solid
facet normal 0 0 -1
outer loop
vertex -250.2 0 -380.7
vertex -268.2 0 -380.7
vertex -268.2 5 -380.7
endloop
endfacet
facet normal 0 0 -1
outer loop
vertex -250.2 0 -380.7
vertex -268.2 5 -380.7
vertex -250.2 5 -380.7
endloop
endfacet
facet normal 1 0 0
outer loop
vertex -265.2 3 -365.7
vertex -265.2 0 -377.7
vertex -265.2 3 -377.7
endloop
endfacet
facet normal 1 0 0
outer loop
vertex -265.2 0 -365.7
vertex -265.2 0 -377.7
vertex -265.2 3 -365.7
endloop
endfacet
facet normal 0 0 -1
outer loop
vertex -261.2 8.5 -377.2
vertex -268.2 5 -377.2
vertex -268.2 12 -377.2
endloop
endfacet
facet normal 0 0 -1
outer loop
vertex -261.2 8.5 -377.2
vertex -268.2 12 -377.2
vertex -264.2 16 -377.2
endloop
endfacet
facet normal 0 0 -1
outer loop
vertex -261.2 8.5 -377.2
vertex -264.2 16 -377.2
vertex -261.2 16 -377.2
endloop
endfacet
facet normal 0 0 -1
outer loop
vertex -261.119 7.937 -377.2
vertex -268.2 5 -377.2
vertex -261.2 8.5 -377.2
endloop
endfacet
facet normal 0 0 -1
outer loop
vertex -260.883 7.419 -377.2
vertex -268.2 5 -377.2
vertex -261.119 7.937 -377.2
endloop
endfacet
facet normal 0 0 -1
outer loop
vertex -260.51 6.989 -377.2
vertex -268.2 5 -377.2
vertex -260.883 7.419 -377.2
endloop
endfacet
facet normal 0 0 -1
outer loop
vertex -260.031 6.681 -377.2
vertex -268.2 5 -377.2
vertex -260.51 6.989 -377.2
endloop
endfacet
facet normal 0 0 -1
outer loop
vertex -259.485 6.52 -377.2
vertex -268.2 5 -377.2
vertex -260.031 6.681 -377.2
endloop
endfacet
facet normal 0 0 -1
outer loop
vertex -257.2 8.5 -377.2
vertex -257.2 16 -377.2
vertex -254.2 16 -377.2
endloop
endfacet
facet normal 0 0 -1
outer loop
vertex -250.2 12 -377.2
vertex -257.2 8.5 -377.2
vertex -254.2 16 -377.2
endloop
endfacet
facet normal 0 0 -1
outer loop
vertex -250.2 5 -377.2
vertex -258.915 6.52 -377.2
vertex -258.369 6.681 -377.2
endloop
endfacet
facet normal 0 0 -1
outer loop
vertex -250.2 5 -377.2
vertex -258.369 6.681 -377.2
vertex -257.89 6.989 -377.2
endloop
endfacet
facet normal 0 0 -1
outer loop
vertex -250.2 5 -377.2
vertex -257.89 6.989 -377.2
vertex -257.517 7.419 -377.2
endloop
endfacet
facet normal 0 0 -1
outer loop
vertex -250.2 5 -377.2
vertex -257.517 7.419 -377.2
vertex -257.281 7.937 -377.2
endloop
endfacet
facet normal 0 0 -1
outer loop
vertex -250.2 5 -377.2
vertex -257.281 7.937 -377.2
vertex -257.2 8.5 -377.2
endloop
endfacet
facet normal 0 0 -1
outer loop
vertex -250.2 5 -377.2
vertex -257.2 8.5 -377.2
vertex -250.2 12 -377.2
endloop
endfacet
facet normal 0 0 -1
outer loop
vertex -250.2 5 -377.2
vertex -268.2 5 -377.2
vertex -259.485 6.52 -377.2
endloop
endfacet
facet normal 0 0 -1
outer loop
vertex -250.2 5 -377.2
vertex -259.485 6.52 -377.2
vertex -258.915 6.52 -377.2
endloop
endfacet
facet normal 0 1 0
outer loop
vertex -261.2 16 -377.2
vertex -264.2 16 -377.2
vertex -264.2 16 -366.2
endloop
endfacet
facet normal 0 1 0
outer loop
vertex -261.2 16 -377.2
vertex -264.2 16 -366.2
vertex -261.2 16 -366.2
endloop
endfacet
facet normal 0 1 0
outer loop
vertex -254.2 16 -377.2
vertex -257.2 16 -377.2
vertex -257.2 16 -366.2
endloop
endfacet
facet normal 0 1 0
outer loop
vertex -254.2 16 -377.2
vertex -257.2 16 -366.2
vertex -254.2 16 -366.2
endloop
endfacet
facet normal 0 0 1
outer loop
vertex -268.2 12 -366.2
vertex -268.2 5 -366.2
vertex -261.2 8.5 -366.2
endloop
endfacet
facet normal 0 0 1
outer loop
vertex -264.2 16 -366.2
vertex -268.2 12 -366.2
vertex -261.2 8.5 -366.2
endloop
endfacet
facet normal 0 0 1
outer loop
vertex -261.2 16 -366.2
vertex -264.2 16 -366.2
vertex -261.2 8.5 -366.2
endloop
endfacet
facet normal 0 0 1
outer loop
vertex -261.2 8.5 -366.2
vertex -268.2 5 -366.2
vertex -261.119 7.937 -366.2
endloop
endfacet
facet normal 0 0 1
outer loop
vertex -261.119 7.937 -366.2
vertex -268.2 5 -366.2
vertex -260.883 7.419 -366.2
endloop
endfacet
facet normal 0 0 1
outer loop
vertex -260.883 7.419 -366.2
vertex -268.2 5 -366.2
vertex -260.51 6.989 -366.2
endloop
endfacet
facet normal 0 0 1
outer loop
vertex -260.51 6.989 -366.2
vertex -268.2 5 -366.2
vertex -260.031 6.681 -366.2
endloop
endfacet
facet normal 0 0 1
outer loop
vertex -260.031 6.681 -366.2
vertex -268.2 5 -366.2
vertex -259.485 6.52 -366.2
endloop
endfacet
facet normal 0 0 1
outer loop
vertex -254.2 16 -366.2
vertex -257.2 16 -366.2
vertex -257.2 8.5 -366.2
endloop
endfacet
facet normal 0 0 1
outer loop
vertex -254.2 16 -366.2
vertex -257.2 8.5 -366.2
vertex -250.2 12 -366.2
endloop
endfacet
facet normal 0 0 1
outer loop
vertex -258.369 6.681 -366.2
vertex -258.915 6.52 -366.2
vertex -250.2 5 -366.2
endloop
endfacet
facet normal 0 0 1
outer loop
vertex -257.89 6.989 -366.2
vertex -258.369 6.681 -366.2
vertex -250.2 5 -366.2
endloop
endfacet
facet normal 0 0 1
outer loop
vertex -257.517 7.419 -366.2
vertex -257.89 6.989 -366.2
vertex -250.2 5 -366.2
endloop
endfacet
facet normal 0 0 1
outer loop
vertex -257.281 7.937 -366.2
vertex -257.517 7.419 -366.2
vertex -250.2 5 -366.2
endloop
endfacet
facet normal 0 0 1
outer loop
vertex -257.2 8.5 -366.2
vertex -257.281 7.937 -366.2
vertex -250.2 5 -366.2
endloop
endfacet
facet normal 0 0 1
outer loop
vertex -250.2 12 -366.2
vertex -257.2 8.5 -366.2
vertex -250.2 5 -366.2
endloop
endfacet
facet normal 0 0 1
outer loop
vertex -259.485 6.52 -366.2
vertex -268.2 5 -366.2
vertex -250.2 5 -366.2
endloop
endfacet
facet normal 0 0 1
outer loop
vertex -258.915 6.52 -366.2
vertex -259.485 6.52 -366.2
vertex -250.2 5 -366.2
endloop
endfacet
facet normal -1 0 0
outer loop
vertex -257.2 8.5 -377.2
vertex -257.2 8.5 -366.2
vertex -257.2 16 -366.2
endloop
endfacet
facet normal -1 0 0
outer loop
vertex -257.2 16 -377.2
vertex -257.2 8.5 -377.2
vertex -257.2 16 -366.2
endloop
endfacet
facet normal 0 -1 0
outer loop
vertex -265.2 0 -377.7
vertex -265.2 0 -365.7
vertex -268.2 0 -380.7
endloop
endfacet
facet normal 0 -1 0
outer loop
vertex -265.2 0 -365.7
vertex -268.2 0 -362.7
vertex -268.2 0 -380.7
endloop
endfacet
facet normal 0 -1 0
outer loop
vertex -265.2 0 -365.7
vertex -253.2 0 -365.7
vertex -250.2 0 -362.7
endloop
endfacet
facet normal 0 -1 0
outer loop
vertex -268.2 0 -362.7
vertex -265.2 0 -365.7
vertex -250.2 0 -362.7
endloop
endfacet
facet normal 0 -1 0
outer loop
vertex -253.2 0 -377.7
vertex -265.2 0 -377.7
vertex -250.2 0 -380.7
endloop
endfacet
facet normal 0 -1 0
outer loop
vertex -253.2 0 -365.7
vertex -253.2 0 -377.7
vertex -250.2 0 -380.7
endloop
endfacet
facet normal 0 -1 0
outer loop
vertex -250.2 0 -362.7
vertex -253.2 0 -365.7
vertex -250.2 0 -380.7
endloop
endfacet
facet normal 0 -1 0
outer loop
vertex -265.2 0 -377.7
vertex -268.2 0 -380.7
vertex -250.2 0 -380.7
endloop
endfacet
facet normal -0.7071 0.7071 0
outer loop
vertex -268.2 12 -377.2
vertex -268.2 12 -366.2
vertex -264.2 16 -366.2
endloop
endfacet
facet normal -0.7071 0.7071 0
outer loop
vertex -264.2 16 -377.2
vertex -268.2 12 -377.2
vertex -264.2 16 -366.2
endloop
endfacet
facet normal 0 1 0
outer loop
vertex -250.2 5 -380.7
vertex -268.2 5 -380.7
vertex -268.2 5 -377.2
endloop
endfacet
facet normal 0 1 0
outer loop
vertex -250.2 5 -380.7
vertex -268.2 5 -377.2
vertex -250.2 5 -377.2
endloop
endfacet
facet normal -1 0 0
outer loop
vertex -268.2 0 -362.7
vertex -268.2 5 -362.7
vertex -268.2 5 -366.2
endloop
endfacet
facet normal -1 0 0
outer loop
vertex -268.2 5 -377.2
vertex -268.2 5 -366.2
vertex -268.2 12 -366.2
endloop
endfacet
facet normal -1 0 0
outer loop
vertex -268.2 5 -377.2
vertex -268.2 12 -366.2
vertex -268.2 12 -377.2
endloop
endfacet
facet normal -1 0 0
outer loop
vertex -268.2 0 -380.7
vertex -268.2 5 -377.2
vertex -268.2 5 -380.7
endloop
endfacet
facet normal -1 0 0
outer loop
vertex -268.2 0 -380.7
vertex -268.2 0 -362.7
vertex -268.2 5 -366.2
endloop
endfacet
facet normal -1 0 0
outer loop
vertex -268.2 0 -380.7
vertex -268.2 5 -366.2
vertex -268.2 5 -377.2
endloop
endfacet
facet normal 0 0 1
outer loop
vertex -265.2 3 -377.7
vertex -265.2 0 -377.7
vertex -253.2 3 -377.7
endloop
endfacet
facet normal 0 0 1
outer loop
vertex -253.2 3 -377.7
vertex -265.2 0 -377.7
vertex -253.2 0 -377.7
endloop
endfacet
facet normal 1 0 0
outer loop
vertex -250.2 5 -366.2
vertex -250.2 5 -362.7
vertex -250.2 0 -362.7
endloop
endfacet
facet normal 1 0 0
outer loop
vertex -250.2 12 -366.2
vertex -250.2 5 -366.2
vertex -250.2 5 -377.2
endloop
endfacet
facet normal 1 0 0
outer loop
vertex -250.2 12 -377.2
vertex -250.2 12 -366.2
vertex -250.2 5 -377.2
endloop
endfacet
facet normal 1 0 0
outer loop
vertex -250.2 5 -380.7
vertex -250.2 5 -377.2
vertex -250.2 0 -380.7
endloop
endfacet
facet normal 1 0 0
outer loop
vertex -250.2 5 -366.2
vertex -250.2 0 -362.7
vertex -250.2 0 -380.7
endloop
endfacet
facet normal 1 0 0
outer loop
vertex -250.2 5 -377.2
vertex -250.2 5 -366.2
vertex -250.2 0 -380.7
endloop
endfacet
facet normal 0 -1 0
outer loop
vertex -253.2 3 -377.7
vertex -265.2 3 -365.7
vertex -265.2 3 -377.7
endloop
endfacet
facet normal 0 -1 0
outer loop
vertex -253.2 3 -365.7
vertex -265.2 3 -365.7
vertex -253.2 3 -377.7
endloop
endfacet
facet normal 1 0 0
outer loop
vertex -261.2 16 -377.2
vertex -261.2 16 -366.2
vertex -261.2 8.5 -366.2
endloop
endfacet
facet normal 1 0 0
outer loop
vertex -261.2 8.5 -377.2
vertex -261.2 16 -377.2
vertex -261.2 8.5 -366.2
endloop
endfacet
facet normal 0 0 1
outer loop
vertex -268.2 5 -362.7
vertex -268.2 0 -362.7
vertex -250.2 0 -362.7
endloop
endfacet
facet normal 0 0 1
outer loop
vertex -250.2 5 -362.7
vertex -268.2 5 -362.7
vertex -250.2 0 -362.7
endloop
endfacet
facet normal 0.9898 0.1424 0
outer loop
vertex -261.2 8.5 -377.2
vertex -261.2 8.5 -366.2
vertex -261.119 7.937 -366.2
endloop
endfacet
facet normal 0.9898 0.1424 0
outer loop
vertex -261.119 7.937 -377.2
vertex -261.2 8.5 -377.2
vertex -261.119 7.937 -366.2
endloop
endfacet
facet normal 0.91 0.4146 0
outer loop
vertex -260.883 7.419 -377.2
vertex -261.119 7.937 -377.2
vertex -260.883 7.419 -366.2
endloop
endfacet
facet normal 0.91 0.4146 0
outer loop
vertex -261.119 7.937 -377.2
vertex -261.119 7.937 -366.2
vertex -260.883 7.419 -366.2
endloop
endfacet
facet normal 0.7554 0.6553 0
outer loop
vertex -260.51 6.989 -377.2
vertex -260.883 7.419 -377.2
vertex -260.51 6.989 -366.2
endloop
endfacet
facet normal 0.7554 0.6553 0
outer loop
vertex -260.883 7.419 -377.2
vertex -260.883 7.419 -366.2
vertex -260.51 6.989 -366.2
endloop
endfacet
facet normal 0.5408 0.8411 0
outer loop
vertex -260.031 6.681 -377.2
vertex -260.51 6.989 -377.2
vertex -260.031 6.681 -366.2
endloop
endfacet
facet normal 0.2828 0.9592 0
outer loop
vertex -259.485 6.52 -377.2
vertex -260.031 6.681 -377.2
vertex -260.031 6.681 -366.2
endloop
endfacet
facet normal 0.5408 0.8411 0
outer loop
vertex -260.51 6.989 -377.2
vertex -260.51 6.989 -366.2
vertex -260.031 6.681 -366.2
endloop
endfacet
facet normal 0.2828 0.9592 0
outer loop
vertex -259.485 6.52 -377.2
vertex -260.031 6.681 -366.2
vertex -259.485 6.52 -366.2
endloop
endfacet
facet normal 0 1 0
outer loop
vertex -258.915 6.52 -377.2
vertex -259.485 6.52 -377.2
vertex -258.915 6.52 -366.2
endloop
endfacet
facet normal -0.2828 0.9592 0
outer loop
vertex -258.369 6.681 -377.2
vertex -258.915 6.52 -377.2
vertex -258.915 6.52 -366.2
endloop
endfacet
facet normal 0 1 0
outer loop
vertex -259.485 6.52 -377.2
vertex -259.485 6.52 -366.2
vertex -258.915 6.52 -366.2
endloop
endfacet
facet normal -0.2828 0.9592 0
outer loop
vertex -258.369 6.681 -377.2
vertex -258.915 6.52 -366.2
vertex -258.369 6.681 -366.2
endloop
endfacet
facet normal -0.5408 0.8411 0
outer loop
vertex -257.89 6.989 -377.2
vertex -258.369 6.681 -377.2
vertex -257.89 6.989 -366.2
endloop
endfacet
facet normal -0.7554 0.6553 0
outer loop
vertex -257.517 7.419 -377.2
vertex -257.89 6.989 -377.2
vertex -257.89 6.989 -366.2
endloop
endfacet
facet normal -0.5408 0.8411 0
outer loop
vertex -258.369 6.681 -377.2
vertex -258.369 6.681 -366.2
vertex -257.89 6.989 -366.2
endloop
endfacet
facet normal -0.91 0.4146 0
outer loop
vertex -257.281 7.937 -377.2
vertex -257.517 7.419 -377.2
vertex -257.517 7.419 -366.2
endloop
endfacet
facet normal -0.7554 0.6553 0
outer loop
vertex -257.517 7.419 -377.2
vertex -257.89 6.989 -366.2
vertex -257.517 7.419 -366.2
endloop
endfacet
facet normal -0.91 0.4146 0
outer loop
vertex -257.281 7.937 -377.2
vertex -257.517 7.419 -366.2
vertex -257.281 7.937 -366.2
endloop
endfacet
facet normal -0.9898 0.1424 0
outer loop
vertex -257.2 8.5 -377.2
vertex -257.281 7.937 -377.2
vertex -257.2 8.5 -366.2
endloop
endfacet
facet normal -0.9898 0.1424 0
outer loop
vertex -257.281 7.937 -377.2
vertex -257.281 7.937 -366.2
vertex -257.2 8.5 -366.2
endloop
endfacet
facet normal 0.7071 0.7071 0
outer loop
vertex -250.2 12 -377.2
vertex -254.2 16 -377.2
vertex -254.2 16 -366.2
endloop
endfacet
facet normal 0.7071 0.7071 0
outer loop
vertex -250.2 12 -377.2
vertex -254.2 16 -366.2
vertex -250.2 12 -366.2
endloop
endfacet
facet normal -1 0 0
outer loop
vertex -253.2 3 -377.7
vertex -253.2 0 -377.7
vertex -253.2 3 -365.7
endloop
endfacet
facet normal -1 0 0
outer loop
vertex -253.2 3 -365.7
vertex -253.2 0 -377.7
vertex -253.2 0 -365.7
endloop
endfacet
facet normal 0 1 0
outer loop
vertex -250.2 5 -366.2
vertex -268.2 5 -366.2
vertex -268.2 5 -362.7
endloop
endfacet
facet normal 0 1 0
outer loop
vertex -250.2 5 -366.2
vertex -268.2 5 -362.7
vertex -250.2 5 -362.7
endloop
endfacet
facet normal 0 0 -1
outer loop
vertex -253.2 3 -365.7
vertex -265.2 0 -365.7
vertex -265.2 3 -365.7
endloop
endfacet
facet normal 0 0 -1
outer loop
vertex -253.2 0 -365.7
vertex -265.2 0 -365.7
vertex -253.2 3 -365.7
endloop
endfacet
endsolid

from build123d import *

# Parameters (mm, degrees)
SKETCH1_W           = 18
SKETCH1_H           = 18
BOSS_EXTRUDE1_DEPTH = 5
SKETCH4_W           = 12
SKETCH4_H           = 12
CUT_EXTRUDE1_DEPTH  = 3
SKETCH5_W           = 18
SKETCH5_H           = 11
BOSS_EXTRUDE2_DEPTH = 11
CUT_EXTRUDE2_DEPTH  = 15.5


with BuildPart() as part:
    # Sketch1 → Boss-Extrude1 (new body)
    with BuildSketch(Plane(origin=(0, 0, 0), x_dir=(1, 0, 0), z_dir=(0, 1, 0))):
        with Locations((-259.2, 371.7)):
            Rectangle(SKETCH1_W, SKETCH1_H)
    extrude(amount=BOSS_EXTRUDE1_DEPTH)

    # Sketch4 → Cut-Extrude1 (cut)
    with BuildSketch(Plane.XZ):
        with Locations((-259.2, -371.7)):
            Rectangle(SKETCH4_W, SKETCH4_H)
    extrude(amount=-CUT_EXTRUDE1_DEPTH, mode=Mode.SUBTRACT)

    # Sketch5 → Boss-Extrude2 (add)
    with BuildSketch(Plane(origin=(0, 5, 0), x_dir=(1, 0, 0), z_dir=(0, 1, 0))):
        with Locations((-259.2, 371.7)):
            Rectangle(SKETCH5_W, SKETCH5_H)
    extrude(amount=BOSS_EXTRUDE2_DEPTH)

    # Sketch7 → Cut-Extrude2 (cut, through all)
    with BuildSketch(Plane.XY.offset(-366.2)):
        with BuildLine():
            ThreePointArc((-261.2, 8.5), (-259.2, 6.5), (-257.2, 8.5))
            Line((-257.2, 8.5), (-261.2, 8.5))
        make_face()
        with BuildLine():
            Line((-261.2, 8.5), (-257.2, 8.5))
            ThreePointArc((-257.2, 8.5), (-259.2, 10.5), (-261.2, 8.5))
        make_face()
        with BuildLine():
            Line((-257.2, 16), (-259.2, 16))
            Line((-259.2, 16), (-261.2, 16))
            Line((-261.2, 16), (-261.2, 8.5))
            ThreePointArc((-261.2, 8.5), (-259.2, 10.5), (-257.2, 8.5))
            Line((-257.2, 8.5), (-257.2, 16))
        make_face()
        Polygon((-250.2, 16), (-254.2, 16), (-250.2, 12), align=None)
        Polygon((-268.2, 12), (-264.2, 16), (-268.2, 16), align=None)
    extrude(amount=-CUT_EXTRUDE2_DEPTH, mode=Mode.SUBTRACT)


solid = part.part
